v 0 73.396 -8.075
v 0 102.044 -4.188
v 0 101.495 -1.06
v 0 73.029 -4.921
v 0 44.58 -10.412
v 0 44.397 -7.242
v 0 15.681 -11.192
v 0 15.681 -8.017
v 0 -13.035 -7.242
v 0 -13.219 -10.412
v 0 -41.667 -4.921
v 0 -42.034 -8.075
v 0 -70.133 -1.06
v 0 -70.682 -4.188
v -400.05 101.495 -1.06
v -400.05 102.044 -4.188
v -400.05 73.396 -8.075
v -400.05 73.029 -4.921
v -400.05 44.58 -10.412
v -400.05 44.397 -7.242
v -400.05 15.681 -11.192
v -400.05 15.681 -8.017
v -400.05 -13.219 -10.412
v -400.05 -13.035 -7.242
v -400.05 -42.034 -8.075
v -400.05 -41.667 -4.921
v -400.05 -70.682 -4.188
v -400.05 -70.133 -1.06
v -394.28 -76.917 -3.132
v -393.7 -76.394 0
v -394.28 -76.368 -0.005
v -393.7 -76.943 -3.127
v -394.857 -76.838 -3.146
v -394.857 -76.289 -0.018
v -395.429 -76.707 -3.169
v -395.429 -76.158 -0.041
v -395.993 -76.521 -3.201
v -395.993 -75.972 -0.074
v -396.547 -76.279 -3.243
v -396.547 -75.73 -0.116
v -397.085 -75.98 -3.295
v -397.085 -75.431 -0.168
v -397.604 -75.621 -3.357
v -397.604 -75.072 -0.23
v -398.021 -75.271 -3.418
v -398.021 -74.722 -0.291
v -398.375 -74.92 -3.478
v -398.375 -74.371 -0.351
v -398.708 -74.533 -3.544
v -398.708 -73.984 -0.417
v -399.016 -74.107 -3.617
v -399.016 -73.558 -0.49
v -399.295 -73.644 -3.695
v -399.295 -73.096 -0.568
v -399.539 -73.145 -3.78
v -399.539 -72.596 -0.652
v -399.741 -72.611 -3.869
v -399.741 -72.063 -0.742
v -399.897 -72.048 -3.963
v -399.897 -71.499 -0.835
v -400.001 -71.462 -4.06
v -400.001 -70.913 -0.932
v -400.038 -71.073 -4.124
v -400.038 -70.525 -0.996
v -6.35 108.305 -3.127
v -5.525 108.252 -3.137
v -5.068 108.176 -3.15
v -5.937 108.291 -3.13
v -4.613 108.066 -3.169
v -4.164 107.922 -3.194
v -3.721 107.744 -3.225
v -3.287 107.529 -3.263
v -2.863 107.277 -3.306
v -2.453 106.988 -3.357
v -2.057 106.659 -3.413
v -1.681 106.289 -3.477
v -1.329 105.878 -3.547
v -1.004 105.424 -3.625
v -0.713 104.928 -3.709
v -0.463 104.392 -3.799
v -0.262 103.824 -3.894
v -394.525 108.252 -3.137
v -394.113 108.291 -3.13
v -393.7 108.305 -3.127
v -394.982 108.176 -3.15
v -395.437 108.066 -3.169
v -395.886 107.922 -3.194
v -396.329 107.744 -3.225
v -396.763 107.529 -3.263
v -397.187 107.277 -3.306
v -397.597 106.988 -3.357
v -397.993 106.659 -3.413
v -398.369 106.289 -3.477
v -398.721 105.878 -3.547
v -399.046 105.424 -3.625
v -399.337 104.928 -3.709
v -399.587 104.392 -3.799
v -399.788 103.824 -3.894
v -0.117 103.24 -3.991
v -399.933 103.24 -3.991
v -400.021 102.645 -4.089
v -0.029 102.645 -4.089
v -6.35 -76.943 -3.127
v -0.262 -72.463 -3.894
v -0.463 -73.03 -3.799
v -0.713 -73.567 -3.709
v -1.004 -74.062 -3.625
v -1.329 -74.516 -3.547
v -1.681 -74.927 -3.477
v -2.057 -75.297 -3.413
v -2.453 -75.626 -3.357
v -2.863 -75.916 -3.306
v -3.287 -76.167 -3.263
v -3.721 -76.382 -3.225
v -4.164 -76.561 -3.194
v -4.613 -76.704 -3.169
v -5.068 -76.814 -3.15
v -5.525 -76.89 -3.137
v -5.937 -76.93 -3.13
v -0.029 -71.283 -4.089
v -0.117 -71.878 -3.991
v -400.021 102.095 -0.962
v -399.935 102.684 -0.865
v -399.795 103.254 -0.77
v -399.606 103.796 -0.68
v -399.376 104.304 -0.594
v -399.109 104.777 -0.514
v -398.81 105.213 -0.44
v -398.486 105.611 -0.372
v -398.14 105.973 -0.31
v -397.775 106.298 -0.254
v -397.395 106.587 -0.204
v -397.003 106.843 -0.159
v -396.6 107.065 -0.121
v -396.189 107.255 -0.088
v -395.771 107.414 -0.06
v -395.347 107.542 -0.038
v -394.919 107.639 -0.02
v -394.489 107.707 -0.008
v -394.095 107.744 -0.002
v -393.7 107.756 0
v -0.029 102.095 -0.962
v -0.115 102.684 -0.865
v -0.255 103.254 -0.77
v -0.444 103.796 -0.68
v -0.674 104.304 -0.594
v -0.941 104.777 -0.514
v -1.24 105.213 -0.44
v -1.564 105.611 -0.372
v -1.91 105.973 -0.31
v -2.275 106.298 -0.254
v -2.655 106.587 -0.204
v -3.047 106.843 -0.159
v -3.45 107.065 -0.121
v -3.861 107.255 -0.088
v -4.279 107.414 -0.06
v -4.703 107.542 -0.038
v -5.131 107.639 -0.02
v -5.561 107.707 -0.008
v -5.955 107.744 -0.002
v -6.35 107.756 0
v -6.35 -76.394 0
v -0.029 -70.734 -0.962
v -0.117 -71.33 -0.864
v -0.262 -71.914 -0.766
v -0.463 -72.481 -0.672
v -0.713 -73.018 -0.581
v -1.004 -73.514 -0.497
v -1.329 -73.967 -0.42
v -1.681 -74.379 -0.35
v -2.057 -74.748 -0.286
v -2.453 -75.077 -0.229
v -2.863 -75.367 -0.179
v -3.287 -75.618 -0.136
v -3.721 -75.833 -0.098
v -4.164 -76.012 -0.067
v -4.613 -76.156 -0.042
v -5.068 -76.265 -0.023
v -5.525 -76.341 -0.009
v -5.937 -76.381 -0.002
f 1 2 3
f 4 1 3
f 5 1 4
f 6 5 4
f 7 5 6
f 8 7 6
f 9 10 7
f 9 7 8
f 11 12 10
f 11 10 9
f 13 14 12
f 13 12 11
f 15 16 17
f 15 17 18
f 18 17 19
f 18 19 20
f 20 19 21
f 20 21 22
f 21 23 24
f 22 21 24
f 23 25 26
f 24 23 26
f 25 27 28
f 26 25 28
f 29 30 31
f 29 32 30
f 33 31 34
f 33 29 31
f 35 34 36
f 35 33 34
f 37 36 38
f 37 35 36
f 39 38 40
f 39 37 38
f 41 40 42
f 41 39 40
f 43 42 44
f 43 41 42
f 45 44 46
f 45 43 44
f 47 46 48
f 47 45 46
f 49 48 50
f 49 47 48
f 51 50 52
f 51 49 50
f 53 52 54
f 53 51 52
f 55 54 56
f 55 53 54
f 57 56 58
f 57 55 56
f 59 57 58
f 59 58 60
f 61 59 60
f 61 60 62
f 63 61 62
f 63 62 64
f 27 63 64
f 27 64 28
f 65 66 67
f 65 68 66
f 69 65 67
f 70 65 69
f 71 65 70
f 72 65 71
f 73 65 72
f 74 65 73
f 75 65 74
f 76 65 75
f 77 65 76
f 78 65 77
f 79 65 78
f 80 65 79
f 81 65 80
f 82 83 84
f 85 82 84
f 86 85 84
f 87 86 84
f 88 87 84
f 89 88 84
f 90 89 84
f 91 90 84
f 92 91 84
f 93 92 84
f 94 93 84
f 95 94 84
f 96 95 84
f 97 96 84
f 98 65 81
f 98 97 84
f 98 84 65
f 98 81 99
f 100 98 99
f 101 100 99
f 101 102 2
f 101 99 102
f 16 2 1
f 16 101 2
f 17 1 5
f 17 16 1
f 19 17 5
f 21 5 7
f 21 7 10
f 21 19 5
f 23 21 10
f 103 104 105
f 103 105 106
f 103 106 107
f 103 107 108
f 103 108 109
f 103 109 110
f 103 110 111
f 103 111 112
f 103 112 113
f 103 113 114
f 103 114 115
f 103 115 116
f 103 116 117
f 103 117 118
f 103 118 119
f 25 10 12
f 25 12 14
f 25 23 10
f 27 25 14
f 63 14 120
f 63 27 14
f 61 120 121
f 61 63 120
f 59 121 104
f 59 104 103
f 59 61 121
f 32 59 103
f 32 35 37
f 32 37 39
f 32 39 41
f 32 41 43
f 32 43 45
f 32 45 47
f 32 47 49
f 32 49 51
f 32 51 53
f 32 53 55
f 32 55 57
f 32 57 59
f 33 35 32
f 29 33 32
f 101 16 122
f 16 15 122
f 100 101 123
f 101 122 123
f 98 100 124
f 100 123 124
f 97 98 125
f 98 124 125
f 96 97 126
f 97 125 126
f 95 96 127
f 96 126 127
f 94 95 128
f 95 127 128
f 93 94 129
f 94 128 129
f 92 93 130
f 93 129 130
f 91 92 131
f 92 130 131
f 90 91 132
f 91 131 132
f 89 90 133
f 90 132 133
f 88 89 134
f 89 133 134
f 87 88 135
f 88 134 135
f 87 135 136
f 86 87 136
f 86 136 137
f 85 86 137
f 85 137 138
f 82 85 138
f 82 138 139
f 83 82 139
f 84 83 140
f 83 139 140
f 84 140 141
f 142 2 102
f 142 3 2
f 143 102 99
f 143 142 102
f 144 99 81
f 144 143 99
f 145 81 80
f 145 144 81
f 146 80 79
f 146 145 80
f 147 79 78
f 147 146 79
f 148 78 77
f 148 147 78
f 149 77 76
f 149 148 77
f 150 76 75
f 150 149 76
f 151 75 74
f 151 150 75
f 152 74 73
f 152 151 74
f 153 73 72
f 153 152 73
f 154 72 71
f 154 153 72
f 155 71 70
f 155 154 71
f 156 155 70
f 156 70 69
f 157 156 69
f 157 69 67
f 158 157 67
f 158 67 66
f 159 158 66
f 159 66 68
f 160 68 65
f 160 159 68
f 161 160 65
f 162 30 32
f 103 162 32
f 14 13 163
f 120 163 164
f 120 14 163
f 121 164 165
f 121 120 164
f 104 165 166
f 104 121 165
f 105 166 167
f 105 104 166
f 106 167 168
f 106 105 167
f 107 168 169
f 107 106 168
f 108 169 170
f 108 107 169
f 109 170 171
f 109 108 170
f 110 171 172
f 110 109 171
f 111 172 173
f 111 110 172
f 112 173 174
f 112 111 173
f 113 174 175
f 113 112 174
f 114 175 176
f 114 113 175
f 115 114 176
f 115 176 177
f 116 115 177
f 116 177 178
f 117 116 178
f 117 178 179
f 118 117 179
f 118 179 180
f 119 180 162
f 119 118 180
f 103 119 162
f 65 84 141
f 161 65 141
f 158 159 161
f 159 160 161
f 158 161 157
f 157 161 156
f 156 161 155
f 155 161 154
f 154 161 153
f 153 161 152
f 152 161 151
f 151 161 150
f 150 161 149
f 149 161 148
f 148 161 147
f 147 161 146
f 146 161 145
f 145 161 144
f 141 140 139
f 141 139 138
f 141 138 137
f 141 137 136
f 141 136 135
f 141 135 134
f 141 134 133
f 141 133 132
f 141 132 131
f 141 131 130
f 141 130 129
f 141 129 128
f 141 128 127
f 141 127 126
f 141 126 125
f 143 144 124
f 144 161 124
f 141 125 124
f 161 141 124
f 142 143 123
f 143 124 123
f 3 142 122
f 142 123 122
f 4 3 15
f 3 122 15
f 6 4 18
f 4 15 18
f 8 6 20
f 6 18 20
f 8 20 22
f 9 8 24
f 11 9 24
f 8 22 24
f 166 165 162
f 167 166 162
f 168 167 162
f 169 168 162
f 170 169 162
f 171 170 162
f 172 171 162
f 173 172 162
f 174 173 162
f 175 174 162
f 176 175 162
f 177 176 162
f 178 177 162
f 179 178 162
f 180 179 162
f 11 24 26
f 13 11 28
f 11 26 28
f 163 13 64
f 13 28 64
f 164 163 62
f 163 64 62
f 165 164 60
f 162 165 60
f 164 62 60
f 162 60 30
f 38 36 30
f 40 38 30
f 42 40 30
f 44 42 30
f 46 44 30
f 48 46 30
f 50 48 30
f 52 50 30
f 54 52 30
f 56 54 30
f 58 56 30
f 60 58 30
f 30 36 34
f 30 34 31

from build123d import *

# Parameters (mm, degrees)
F3_R = 6.35
F4_R = 6.35
F5_R = 6.35


with BuildPart() as f2:
    # F2: sweep along a path in F1
    with BuildLine(Plane.XZ) as f2_path:
        Line((0, 0), (-400.05, 0))
    # F0 (on Right) → F2 (sweep)
    with BuildSketch(Plane.YZ):
        with BuildLine():
            ThreePointArc((107.7558518291, 0), (15.6808518291, -8.0168287935), (-76.3941481709, 0))
            Line((-76.3941481709, 0), (-76.9428730772, -3.1272233654))
            ThreePointArc((-76.9428730772, -3.1272233654), (15.6808518291, -11.1918287935), (108.3045767353, -3.1272233654))
            Line((108.3045767353, -3.1272233654), (107.7558518291, 0))
        make_face()
    sweep(path=f2_path.line)

    # F3
    f3_edges = [f2.edges().sort_by_distance(p)[0] for p in [
        (-400.05, -76.668511, -1.563612),
    ]]
    fillet(f3_edges, radius=F3_R)

    # F4
    f4_edges = [f2.edges().sort_by_distance(p)[0] for p in [
        (-400.05, 108.030214, -1.563612),
        (0, 108.030214, -1.563612),
    ]]
    fillet(f4_edges, radius=F4_R)

    # F5
    f5_edges = [f2.edges().sort_by_distance(p)[0] for p in [
        (0, -76.668511, -1.563612),
    ]]
    fillet(f5_edges, radius=F5_R)


solid = f2.part
